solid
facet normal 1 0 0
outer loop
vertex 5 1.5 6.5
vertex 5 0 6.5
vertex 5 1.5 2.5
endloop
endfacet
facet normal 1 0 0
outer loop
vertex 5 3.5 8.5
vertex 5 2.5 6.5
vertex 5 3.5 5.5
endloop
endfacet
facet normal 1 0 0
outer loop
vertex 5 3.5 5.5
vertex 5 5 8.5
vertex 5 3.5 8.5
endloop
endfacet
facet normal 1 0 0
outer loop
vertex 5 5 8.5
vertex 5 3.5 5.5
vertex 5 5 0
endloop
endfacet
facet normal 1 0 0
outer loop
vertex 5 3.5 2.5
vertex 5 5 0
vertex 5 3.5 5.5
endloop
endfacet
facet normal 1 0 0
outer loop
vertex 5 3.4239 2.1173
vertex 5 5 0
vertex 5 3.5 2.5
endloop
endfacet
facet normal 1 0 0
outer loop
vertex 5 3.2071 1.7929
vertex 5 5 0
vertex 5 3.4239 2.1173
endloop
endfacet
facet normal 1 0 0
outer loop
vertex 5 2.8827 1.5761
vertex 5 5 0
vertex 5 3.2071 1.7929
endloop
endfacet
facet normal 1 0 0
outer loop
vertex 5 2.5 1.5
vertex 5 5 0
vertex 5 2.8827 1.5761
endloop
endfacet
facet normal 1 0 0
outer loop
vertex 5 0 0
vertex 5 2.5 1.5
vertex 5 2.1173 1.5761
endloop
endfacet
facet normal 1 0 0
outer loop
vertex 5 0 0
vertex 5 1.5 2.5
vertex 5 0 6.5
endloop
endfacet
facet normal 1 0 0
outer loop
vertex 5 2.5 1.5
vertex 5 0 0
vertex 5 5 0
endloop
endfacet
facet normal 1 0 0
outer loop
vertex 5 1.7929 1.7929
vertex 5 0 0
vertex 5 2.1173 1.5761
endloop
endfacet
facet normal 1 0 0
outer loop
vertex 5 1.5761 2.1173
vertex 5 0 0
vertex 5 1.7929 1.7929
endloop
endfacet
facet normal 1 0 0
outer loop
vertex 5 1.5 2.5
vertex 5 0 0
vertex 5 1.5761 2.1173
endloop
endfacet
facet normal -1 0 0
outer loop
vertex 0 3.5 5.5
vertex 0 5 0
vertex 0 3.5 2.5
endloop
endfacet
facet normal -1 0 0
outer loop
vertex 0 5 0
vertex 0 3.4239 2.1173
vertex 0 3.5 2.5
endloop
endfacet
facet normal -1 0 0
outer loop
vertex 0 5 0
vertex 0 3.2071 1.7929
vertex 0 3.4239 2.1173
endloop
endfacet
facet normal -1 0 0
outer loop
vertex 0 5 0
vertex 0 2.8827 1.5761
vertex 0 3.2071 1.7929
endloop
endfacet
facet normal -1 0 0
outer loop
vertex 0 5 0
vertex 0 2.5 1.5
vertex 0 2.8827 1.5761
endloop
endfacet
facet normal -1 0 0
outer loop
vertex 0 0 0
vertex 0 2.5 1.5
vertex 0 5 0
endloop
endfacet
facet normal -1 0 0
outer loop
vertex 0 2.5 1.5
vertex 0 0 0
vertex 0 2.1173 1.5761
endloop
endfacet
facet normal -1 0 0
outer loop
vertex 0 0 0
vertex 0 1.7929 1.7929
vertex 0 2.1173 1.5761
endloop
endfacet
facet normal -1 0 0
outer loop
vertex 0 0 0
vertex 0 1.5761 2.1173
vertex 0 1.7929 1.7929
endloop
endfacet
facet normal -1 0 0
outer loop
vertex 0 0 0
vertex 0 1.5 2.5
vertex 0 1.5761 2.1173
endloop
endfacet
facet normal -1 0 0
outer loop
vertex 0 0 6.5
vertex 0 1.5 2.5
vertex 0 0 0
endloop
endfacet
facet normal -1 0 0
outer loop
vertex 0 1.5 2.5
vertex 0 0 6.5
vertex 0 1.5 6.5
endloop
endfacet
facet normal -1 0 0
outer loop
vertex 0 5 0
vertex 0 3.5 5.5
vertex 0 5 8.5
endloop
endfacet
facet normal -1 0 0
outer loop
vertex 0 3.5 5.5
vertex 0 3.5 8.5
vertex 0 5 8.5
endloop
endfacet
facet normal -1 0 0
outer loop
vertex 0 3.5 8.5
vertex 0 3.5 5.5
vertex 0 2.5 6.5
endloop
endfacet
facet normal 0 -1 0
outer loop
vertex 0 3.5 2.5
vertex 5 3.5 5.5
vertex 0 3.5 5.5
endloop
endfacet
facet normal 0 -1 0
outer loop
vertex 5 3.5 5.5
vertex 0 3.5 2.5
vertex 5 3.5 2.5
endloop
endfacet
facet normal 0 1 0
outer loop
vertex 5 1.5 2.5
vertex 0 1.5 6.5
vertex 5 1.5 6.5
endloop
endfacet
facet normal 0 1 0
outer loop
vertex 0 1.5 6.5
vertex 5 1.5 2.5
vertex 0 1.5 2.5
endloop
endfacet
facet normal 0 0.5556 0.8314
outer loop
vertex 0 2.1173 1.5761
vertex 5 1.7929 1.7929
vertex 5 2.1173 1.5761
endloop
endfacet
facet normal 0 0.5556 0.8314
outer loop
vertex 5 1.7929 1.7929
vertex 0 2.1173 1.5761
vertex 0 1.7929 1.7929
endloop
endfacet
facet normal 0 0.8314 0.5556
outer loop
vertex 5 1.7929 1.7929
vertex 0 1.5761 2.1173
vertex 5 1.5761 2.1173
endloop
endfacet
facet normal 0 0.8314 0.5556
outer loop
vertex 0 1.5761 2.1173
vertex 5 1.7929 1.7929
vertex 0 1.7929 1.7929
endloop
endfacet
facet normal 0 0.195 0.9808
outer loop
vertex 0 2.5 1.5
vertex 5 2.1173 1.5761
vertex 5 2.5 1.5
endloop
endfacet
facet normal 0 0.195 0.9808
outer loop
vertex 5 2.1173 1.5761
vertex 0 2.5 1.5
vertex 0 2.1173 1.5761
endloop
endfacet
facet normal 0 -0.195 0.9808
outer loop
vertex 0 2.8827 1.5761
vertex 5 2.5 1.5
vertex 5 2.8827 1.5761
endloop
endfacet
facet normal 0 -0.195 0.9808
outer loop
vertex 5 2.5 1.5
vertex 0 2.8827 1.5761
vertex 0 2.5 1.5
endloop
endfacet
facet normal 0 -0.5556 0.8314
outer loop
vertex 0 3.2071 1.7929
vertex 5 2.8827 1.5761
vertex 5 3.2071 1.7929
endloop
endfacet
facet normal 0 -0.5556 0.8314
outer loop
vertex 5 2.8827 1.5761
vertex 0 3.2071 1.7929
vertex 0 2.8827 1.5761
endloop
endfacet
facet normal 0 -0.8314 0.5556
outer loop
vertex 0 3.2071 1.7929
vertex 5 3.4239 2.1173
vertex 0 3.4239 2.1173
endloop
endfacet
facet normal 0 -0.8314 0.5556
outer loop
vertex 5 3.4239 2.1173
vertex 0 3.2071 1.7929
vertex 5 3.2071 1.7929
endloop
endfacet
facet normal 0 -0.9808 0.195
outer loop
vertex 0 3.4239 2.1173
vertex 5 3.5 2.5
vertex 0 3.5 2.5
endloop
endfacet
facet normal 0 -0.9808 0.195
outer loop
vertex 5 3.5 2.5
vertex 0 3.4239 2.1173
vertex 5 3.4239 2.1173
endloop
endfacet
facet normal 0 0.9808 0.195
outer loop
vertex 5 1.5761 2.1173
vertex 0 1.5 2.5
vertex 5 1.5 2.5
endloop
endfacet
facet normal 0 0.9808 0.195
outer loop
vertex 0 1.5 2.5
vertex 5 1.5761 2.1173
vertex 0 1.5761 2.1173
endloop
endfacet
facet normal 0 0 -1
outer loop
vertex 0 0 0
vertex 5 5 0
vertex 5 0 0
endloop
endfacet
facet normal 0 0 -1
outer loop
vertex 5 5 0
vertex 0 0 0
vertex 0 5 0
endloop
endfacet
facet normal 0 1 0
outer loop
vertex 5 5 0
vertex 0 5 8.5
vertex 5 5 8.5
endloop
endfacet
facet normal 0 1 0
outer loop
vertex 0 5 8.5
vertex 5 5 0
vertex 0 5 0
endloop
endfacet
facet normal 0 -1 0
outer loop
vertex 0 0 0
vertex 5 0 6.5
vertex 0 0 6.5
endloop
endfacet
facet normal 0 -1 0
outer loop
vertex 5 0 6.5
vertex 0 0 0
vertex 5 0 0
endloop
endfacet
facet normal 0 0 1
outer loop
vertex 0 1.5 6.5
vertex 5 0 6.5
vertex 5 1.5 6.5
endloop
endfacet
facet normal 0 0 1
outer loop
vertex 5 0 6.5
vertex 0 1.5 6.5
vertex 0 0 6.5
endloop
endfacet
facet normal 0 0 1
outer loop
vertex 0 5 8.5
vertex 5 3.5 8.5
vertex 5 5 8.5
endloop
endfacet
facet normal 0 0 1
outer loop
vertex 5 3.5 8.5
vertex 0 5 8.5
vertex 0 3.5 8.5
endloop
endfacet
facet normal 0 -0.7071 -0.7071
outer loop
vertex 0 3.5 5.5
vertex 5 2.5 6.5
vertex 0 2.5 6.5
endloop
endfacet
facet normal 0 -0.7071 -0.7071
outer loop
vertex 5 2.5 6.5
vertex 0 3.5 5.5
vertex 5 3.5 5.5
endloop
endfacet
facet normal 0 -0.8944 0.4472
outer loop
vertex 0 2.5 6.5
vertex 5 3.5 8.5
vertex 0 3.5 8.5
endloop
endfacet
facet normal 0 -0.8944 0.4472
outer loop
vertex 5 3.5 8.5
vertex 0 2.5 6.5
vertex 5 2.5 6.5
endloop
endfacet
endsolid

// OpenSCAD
// Single Hook Upright Clip Component 
EPSILON = 0.01; // For padding negative volumes to fix z-fighting

module hookHead(hookHeight, hookProtrusion, hookBottomAngle, thickness) {
    linear_extrude(height=clipWidth)
        polygon(points=[[0,0], [0,hookHeight],
            [hookProtrusion, hookProtrusion / tan(hookBottomAngle)]]
        );
}

module cornerReinforcement(spaceBetweenWalls, clipWidth) {
    difference() {
        cube([clipWidth, spaceBetweenWalls, spaceBetweenWalls/2]);
        translate([-EPSILON, spaceBetweenWalls/2, spaceBetweenWalls/2])
            rotate([0, 90, 0])
            scale([1, 1, 1 + (2 * EPSILON)])
            cylinder(h=clipWidth, r=spaceBetweenWalls/2);
    }
}

module clipComponent(clipParmList) {
    clipWidth = clipParmList[0];
    frontWallHeight = clipParmList[1];
    frontWallThickness = clipParmList[2];
    spaceBetweenWalls = clipParmList[3];
    bottomThickness = clipParmList[4];
    backWallHeight = clipParmList[5];
    backWallThickness = clipParmList[6];
    hookHeight = clipParmList[7];
    hookProtusion = clipParmList[8];
    hookBottomAngle = clipParmList[9];
    
    // Front wall
    cube([clipWidth, frontWallThickness + spaceBetweenWalls + backWallThickness, bottomThickness]);
    // Bottom
    translate([0, 0, bottomThickness])
        cube([clipWidth, frontWallThickness, frontWallHeight]);
    // Back wall
    translate([0, frontWallThickness + spaceBetweenWalls, bottomThickness])
        cube([clipWidth, backWallThickness, backWallHeight]);
    // Add rounded corner reinforcement for wall bending during clip insertion
    translate([0, frontWallThickness, bottomThickness])
        cornerReinforcement(spaceBetweenWalls, clipWidth);
    // Hook head
    translate([clipWidth, frontWallThickness + spaceBetweenWalls, backWallHeight + bottomThickness - hookHeight])
        rotate([90, 0, -90])
        hookHead(hookHeight, hookProtrusion, hookBottomAngle, clipWidth);
}

// Parameters
$fn = 16; // global var controlling number of vertices in a cylinder

clipWidth = 5;

frontWallHeight = 5;
frontWallThickness = 1.5;

spaceBetweenWalls = 2;

bottomThickness = 1.5;
backWallHeight = 7;
backWallThickness = 1.5;

hookHeight = 3; // how much wall space the hook head occupies
hookProtrusion = 1; // how far out the hook head extends
hookBottomAngle = 45; // bottom angle of the hook off the wall (angle > 45 degrees may need supports)

clipParmList = [
    clipWidth, frontWallHeight, frontWallThickness, spaceBetweenWalls, bottomThickness,
    backWallHeight, backWallThickness, hookHeight, hookProtrusion, hookBottomAngle
];

clipComponent(clipParmList);
